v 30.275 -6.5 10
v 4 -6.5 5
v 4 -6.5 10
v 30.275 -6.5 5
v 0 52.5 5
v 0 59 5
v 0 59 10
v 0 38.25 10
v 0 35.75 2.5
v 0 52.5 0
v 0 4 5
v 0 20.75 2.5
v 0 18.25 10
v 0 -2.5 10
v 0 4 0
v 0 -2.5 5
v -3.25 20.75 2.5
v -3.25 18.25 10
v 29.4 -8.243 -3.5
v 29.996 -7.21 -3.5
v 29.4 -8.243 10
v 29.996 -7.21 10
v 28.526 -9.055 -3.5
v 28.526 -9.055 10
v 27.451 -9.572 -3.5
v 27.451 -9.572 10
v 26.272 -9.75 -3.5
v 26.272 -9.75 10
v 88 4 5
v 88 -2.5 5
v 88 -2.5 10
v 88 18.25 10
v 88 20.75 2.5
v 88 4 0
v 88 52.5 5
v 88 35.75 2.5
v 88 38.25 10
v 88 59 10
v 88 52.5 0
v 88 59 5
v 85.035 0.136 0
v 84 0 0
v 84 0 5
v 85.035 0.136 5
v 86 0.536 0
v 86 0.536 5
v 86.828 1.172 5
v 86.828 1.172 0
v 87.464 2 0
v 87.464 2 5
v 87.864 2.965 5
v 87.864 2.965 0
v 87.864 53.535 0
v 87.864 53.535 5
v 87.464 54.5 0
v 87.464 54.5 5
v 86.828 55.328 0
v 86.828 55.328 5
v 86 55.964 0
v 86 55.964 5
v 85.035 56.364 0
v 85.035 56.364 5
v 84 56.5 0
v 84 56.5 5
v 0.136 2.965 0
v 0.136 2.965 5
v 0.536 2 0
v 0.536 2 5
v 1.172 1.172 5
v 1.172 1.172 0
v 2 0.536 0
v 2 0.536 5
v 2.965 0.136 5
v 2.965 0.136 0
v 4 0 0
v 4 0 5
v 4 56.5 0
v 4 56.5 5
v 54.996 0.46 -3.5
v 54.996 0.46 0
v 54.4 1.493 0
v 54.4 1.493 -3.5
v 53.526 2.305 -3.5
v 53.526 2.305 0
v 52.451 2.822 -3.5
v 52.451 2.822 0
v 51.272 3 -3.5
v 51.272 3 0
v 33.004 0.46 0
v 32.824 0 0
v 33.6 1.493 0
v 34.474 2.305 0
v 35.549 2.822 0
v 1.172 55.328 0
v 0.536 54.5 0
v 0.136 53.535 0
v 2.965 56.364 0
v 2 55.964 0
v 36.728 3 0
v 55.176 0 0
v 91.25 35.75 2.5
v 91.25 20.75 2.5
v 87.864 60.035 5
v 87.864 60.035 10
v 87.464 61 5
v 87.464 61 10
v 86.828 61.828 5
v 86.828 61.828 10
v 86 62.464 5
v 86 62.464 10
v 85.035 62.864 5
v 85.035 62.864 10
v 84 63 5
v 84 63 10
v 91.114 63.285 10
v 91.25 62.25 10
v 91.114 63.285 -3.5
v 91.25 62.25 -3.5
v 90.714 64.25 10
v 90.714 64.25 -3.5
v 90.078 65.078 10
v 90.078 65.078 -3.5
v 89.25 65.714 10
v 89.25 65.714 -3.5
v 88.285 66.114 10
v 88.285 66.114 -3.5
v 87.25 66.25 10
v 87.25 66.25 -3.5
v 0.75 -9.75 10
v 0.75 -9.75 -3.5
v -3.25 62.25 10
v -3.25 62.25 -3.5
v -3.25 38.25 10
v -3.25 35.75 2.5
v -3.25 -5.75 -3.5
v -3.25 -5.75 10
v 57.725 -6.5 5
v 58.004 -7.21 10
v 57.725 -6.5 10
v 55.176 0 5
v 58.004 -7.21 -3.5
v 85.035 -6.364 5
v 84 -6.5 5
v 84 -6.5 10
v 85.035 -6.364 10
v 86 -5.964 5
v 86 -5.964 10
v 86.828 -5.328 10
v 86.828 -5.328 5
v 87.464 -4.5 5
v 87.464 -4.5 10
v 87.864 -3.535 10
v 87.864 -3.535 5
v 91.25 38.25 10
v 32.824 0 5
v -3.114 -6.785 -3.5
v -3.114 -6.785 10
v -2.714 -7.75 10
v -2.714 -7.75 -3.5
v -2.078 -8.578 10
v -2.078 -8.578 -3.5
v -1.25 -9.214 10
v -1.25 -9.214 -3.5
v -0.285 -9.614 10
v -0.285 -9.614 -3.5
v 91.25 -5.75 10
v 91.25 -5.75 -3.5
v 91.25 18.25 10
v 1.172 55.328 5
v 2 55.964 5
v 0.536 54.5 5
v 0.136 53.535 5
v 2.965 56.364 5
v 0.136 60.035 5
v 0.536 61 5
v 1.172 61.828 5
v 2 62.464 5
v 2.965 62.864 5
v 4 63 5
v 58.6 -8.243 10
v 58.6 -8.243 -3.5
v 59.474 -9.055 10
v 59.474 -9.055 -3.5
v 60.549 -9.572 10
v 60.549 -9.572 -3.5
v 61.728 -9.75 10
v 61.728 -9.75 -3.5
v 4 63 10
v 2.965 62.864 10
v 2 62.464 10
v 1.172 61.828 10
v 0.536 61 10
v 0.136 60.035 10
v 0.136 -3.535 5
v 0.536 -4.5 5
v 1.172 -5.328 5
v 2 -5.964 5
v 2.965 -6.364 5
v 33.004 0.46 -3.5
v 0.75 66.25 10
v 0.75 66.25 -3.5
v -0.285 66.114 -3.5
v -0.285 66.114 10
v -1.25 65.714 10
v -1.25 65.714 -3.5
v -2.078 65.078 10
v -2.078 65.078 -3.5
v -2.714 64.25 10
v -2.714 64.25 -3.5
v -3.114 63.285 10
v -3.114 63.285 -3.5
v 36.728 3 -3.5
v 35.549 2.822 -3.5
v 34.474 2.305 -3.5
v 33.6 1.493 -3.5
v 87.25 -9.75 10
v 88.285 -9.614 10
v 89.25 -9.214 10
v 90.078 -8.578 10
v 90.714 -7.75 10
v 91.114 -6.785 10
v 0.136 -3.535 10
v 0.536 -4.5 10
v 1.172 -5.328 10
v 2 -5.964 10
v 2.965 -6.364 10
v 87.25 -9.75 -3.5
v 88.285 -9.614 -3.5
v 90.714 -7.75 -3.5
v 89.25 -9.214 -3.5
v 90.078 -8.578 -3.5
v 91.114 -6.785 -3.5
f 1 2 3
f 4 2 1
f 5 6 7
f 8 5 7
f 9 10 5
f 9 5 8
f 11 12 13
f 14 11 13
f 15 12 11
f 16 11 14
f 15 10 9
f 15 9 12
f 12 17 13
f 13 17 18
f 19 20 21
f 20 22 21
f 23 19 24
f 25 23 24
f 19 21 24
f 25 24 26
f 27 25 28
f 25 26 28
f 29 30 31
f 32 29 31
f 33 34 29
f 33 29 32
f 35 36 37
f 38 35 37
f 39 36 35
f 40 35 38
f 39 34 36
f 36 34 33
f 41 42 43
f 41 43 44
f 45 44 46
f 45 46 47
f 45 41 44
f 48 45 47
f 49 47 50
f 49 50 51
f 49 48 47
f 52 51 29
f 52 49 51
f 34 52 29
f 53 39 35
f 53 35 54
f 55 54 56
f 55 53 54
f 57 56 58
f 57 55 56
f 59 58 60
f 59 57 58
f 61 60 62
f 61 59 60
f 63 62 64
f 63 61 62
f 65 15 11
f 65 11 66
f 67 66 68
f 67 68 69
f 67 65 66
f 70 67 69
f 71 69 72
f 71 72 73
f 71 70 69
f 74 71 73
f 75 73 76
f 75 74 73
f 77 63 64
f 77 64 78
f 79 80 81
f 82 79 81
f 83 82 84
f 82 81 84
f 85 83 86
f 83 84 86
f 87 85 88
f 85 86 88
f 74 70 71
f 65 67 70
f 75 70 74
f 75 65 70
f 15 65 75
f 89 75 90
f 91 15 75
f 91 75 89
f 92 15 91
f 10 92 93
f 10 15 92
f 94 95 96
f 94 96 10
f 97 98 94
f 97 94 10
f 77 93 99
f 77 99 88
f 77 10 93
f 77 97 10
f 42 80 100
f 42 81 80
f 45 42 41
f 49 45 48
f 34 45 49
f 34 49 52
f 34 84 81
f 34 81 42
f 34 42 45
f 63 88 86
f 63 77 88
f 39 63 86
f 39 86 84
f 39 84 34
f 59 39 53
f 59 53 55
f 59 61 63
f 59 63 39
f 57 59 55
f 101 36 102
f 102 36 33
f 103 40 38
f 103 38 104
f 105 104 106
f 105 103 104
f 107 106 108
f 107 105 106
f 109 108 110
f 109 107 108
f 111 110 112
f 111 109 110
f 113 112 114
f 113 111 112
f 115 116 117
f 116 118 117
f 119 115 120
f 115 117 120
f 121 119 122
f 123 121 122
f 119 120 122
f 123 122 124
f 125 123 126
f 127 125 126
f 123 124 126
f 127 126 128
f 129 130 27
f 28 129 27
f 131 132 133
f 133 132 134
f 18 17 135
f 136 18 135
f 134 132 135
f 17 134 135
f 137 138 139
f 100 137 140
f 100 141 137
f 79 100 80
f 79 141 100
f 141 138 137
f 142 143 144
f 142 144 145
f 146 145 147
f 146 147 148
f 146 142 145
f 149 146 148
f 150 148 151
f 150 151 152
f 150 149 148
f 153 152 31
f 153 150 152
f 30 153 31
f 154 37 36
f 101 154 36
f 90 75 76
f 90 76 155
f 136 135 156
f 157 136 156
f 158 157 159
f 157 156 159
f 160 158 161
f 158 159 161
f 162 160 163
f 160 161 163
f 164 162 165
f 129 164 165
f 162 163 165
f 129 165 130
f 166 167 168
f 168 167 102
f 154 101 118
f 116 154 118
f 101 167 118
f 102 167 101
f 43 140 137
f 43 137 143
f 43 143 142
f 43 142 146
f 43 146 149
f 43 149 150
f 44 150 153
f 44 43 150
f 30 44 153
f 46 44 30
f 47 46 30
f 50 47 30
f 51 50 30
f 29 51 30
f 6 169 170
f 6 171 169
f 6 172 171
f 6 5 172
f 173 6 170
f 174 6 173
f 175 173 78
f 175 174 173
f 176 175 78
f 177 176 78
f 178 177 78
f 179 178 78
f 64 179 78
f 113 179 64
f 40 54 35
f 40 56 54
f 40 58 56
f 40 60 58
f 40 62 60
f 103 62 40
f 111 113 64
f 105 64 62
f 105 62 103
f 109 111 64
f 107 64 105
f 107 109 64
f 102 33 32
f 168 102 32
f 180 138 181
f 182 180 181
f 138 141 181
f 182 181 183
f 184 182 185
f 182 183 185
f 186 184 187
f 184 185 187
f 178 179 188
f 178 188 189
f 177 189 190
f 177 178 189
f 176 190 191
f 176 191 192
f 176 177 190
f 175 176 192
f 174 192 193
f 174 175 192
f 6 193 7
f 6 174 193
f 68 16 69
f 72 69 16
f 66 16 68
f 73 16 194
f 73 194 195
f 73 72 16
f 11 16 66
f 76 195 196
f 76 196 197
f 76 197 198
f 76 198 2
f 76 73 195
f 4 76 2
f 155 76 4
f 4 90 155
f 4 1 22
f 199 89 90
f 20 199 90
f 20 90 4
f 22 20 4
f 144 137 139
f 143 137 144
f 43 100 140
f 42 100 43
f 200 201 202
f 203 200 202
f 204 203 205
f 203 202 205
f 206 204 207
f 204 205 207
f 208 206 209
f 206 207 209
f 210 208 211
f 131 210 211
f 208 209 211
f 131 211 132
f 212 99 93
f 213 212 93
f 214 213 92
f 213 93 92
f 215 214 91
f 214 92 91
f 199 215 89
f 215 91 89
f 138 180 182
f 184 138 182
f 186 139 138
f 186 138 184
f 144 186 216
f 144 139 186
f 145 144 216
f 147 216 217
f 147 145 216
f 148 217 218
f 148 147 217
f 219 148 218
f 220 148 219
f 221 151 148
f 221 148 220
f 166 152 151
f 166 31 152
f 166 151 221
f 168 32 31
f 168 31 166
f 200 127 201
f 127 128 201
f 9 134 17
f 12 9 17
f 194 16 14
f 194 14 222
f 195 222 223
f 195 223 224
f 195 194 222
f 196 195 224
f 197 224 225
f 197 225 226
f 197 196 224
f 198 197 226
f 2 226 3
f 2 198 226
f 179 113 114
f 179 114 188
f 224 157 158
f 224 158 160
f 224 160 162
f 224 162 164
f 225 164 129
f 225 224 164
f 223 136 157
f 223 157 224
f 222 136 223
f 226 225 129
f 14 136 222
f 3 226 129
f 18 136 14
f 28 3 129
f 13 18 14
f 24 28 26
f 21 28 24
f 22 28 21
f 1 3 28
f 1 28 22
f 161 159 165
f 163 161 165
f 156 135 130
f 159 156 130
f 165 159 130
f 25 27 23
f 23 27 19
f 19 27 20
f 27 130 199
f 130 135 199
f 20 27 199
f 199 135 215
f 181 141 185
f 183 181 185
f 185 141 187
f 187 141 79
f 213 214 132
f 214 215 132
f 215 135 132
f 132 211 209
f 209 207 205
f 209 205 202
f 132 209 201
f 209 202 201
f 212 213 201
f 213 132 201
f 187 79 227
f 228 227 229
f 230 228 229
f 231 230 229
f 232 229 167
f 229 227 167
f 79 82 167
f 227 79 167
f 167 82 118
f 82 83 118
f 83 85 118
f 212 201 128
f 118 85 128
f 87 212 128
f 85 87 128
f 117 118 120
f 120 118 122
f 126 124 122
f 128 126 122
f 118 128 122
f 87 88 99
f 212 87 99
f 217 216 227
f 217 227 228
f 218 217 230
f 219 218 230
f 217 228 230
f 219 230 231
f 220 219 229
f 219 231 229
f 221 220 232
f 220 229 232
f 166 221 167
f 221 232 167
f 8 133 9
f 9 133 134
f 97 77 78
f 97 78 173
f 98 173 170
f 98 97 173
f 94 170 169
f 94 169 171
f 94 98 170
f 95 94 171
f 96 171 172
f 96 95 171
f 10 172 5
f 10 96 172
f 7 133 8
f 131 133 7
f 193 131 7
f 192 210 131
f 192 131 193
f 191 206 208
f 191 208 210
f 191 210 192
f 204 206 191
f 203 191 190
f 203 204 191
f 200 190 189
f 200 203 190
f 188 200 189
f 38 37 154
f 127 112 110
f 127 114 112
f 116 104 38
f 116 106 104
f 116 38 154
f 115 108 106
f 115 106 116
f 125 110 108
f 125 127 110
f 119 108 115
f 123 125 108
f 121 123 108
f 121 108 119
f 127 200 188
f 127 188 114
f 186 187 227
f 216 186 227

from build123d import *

# Parameters (mm, degrees)
F2_DEPTH      = 3.5
F2_DEPTH_BACK = 10
F3_DEPTH      = 5
F5_START      = 5
F5_DEPTH      = 5
F7_DEPTH      = 10
F7_DEPTH_BACK = 3.5
F8_R          = 4
F10_DEPTH     = 94.501


with BuildPart() as f2:
    # F1 (on Top) → F2 (new body, two sides)
    with BuildSketch(Plane.XY) as f2_sk:
        with BuildLine():
            ThreePointArc((-3.25, -5.75), (-2.0784271247, -8.5784271247), (0.75, -9.75))
            Line((0.75, -9.75), (87.25, -9.75))
            ThreePointArc((87.25, -9.75), (90.0784271247, -8.5784271247), (91.25, -5.75))
            Line((91.25, -5.75), (91.25, 62.25))
            ThreePointArc((91.25, 62.25), (90.0784271247, 65.0784271247), (87.25, 66.25))
            Line((87.25, 66.25), (0.75, 66.25))
            ThreePointArc((0.75, 66.25), (-2.0784271247, 65.0784271247), (-3.25, 62.25))
            Line((-3.25, 62.25), (-3.25, -5.75))
        make_face()
    extrude(amount=-F2_DEPTH)
    extrude(f2_sk.sketch, amount=F2_DEPTH_BACK)

    # F0 (on Top) → F3 (cut)
    with BuildSketch(Plane.XY):
        with BuildLine():
            ThreePointArc((0, 4), (1.1715728753, 1.1715728753), (4, 0))
            Line((4, 0), (84, 0))
            ThreePointArc((84, 0), (86.8284271247, 1.1715728753), (88, 4))
            Line((88, 4), (88, 52.5))
            ThreePointArc((88, 52.5), (86.8284271247, 55.3284271247), (84, 56.5))
            Line((84, 56.5), (4, 56.5))
            ThreePointArc((4, 56.5), (1.1715728753, 55.3284271247), (0, 52.5))
            Line((0, 52.5), (0, 4))
        make_face()
    extrude(amount=F3_DEPTH, mode=Mode.SUBTRACT)

    # F4 (on Top) → F5 (cut)
    with BuildSketch(Plane.XY.offset(F5_START)):
        with BuildLine():
            ThreePointArc((0, -2.5), (1.1715728753, -5.3284271247), (4, -6.5))
            Line((4, -6.5), (84, -6.5))
            ThreePointArc((84, -6.5), (86.8284271247, -5.3284271247), (88, -2.5))
            Line((88, -2.5), (88, 59))
            ThreePointArc((88, 59), (86.8284271247, 61.8284271247), (84, 63))
            Line((84, 63), (4, 63))
            ThreePointArc((4, 63), (1.1715728753, 61.8284271247), (0, 59))
            Line((0, 59), (0, -2.5))
        make_face()
    extrude(amount=F5_DEPTH, mode=Mode.SUBTRACT)

    # F6 (on Top) → F7 (cut, two sides)
    with BuildSketch(Plane.XY) as f7_sk:
        with BuildLine():
            Line((33.0040588687, 0.4603501153), (29, -9.75))
            Line((29, -9.75), (44, -9.75))
            Line((44, -9.75), (59, -9.75))
            Line((59, -9.75), (54.9959411313, 0.4603501153))
            ThreePointArc((54.9959411313, 0.4603501153), (53.5257785273, 2.3046482764), (51.2720483373, 3))
            Line((51.2720483373, 3), (44, 3))
            Line((44, 3), (36.7279516627, 3))
            ThreePointArc((36.7279516627, 3), (34.4742214727, 2.3046482764), (33.0040588687, 0.4603501153))
        make_face()
    extrude(amount=F7_DEPTH, mode=Mode.SUBTRACT)
    extrude(f7_sk.sketch, amount=-F7_DEPTH_BACK, mode=Mode.SUBTRACT)

    # F8
    f8_edges = [f2.edges().sort_by_distance(p)[0] for p in [
        (59, -9.75, 3.25),
        (29, -9.75, 3.25),
    ]]
    fillet(f8_edges, radius=F8_R)

    # F9 (on face) → F10 (cut, through all)
    with BuildSketch(Plane(origin=(-3.25, 0, 0), x_dir=(0, -1, 0), z_dir=(-1, 0, 0))):
        Polygon((-20.75, 2.5), (-18.25, 10), (-28.25, 10), (-38.25, 10), (-35.75, 2.5), (-28.25, 2.5), align=None)
    extrude(amount=-F10_DEPTH, mode=Mode.SUBTRACT)


solid = f2.part
